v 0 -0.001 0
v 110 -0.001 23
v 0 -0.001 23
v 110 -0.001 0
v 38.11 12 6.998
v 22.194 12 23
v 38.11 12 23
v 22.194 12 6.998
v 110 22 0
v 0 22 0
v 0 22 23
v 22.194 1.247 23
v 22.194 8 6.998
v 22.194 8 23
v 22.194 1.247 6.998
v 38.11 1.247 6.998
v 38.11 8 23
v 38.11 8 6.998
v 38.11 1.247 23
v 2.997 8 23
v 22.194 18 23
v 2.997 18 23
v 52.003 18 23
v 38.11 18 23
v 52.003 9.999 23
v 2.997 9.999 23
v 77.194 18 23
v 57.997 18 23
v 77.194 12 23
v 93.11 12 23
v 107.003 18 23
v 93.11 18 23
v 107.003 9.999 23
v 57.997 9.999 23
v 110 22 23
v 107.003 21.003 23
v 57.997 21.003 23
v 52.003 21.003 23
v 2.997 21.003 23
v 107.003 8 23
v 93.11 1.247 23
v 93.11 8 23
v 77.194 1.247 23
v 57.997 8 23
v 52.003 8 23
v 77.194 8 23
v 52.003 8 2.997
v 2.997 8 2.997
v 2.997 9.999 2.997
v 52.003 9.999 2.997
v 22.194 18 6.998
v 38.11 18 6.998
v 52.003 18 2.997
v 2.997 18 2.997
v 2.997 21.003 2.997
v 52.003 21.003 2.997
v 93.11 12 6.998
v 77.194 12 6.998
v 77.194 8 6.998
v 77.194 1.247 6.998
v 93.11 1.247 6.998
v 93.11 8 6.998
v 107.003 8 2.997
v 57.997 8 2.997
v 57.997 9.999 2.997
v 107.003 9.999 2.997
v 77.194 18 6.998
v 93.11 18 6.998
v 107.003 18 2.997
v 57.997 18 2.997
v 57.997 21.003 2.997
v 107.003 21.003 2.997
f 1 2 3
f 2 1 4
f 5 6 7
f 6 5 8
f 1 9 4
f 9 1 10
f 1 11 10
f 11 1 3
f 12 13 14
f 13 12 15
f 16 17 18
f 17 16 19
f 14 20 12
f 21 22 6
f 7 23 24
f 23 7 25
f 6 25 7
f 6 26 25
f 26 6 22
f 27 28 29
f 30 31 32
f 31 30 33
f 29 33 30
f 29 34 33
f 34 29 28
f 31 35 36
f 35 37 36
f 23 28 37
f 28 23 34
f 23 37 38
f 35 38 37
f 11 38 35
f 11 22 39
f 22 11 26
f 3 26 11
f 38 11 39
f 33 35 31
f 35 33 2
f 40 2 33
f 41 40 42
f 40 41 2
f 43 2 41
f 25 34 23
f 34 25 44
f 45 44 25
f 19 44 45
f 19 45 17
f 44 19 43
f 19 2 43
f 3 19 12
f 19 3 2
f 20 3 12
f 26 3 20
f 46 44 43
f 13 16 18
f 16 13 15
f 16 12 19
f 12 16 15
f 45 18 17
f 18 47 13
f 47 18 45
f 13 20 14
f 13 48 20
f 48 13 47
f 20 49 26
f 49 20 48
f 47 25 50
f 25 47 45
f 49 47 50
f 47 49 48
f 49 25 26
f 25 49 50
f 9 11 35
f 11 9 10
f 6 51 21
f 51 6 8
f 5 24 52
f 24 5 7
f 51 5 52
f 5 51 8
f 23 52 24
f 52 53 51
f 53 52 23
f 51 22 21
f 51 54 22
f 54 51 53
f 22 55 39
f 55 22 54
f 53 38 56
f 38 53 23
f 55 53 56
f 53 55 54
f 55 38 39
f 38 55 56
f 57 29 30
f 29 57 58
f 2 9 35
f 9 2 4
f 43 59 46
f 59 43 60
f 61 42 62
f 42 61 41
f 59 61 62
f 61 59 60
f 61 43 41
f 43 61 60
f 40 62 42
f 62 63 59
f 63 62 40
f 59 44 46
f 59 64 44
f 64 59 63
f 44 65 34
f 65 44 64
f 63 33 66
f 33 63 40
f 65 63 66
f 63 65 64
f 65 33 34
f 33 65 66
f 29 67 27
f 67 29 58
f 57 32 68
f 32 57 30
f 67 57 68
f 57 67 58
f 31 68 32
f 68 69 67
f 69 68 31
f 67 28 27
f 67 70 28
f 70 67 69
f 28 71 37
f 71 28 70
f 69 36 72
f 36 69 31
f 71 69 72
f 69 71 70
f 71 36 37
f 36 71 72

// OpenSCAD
//----------------------------------------------------------------------------
//	Filename:	MakeyMakeyHolder.scad
//	Author:		Nicolai Naglestad
//	Date:		Monday, 27 June 2016
//
//	Customizable Makey Makey holder.
//----------------------------------------------------------------------------

//---[ USER Customizable Parameters ]-----------------------------------------

// How many rows to generate
row_amount = 2; // [1:10]
// How many columns to generate
column_amount = 2;  // [1:10]

//---[ Holder converted using thingiverse.com/thing:62666 ]-------------------
module holder(scale) {polyhedron(
 points=[[10,-0.0010000000474974513,23],[10,-0.0010000000474974513,0],[65,-0.0010000000474974513,0],[10,-0.0010000000474974513,23],[65,-0.0010000000474974513,0],[65,-0.0010000000474974513,23],[10,12,0],[10,12,23],[65,12,23],[10,12,0],[65,12,23],[65,12,0],[65,-0.0010000000474974513,0],[10,12,0],[65,12,0],[10,12,0],[65,-0.0010000000474974513,0],[10,-0.0010000000474974513,0],[10,-0.0010000000474974513,0],[10,-0.0010000000474974513,23],[10,12,0],[65,12,23],[65,-0.0010000000474974513,23],[65,-0.0010000000474974513,0],[65,12,23],[65,-0.0010000000474974513,0],[65,12,0],[12.996999740600586,11.003000259399414,23],[10,12,23],[12.996999740600586,8,23],[32.194000244140625,1.246999979019165,23],[32.194000244140625,8,23],[12.996999740600586,8,23],[65,12,23],[62.00299835205078,8,23],[65,-0.0010000000474974513,23],[48.11000061035156,8,23],[48.11000061035156,1.246999979019165,23],[62.00299835205078,8,23],[48.11000061035156,1.246999979019165,23],[65,-0.0010000000474974513,23],[62.00299835205078,8,23],[32.194000244140625,1.246999979019165,23],[32.194000244140625,1.246999979019165,6.998000144958496],[32.194000244140625,8,6.998000144958496],[32.194000244140625,1.246999979019165,23],[32.194000244140625,8,6.998000144958496],[32.194000244140625,8,23],[12.996999740600586,8,23],[32.194000244140625,8,23],[32.194000244140625,8,6.998000144958496],[48.11000061035156,8,23],[48.11000061035156,8,6.998000144958496],[48.11000061035156,1.246999979019165,6.998000144958496],[48.11000061035156,8,23],[48.11000061035156,1.246999979019165,6.998000144958496],[48.11000061035156,1.246999979019165,23],[10,-0.0010000000474974513,23],[12.996999740600586,8,23],[10,12,23],[62.00299835205078,8,23],[62.00299835205078,11.003000259399414,23],[62.00299835205078,8,2.996999979019165],[62.00299835205078,8,23],[65,12,23],[62.00299835205078,11.003000259399414,23],[62.00299835205078,8,2.996999979019165],[48.11000061035156,8,6.998000144958496],[62.00299835205078,8,23],[48.11000061035156,8,23],[62.00299835205078,8,23],[48.11000061035156,8,6.998000144958496],[10,12,23],[12.996999740600586,11.003000259399414,23],[62.00299835205078,11.003000259399414,23],[10,12,23],[62.00299835205078,11.003000259399414,23],[65,12,23],[48.11000061035156,1.246999979019165,6.998000144958496],[48.11000061035156,8,6.998000144958496],[32.194000244140625,8,6.998000144958496],[48.11000061035156,1.246999979019165,6.998000144958496],[32.194000244140625,8,6.998000144958496],[32.194000244140625,1.246999979019165,6.998000144958496],[10,-0.0010000000474974513,23],[65,-0.0010000000474974513,23],[32.194000244140625,1.246999979019165,23],[32.194000244140625,1.246999979019165,23],[12.996999740600586,8,23],[10,-0.0010000000474974513,23],[48.11000061035156,1.246999979019165,23],[32.194000244140625,1.246999979019165,23],[65,-0.0010000000474974513,23],[10,12,23],[10,12,0],[10,-0.0010000000474974513,23],[32.194000244140625,1.246999979019165,6.998000144958496],[32.194000244140625,1.246999979019165,23],[48.11000061035156,1.246999979019165,23],[32.194000244140625,1.246999979019165,6.998000144958496],[48.11000061035156,1.246999979019165,23],[48.11000061035156,1.246999979019165,6.998000144958496],[12.996999740600586,8,2.996999979019165],[32.194000244140625,8,6.998000144958496],[62.00299835205078,8,2.996999979019165],[12.996999740600586,8,23],[32.194000244140625,8,6.998000144958496],[12.996999740600586,8,2.996999979019165],[32.194000244140625,8,6.998000144958496],[48.11000061035156,8,6.998000144958496],[62.00299835205078,8,2.996999979019165],[12.996999740600586,11.003000259399414,23],[12.996999740600586,8,2.996999979019165],[12.996999740600586,11.003000259399414,2.996999979019165],[12.996999740600586,8,23],[12.996999740600586,8,2.996999979019165],[12.996999740600586,11.003000259399414,23],[62.00299835205078,11.003000259399414,2.996999979019165],[62.00299835205078,8,2.996999979019165],[62.00299835205078,11.003000259399414,23],[12.996999740600586,11.003000259399414,2.996999979019165],[12.996999740600586,8,2.996999979019165],[62.00299835205078,11.003000259399414,2.996999979019165],[62.00299835205078,8,2.996999979019165],[62.00299835205078,11.003000259399414,2.996999979019165],[12.996999740600586,8,2.996999979019165],[12.996999740600586,11.003000259399414,23],[12.996999740600586,11.003000259399414,2.996999979019165],[62.00299835205078,11.003000259399414,2.996999979019165],[12.996999740600586,11.003000259399414,23],[62.00299835205078,11.003000259399414,2.996999979019165],[62.00299835205078,11.003000259399414,23] ],
faces=[[0,1,2],[3,4,5],[6,7,8],[9,10,11],[12,13,14],[15,16,17],[18,19,20],[21,22,23],[24,25,26],[27,28,29],[30,31,32],[33,34,35],[36,37,38],[39,40,41],[42,43,44],[45,46,47],[48,49,50],[51,52,53],[54,55,56],[57,58,59],[60,61,62],[63,64,65],[66,67,68],[69,70,71],[72,73,74],[75,76,77],[78,79,80],[81,82,83],[84,85,86],[87,88,89],[90,91,92],[93,94,95],[96,97,98],[99,100,101],[102,103,104],[105,106,107],[108,109,110],[111,112,113],[114,115,116],[117,118,119],[120,121,122],[123,124,125],[126,127,128],[129,130,131]]);}

//---[ Make rows and culumns ]------------------------------------------------
module holderRows(scale) {
    for (i = [0: row_amount-1]){
        translate([0, i*10, 0])
        holder(1);
    }
}


module holderCulumns(scale) {
    for (x = [0: column_amount-1]){
            translate([x*55, 0, 0])
            holderRows(1);
        }
}

//---[ Create the new object ]-------------------------------------------------
translate([-10,0,0]) {
    holderCulumns(1);
}

